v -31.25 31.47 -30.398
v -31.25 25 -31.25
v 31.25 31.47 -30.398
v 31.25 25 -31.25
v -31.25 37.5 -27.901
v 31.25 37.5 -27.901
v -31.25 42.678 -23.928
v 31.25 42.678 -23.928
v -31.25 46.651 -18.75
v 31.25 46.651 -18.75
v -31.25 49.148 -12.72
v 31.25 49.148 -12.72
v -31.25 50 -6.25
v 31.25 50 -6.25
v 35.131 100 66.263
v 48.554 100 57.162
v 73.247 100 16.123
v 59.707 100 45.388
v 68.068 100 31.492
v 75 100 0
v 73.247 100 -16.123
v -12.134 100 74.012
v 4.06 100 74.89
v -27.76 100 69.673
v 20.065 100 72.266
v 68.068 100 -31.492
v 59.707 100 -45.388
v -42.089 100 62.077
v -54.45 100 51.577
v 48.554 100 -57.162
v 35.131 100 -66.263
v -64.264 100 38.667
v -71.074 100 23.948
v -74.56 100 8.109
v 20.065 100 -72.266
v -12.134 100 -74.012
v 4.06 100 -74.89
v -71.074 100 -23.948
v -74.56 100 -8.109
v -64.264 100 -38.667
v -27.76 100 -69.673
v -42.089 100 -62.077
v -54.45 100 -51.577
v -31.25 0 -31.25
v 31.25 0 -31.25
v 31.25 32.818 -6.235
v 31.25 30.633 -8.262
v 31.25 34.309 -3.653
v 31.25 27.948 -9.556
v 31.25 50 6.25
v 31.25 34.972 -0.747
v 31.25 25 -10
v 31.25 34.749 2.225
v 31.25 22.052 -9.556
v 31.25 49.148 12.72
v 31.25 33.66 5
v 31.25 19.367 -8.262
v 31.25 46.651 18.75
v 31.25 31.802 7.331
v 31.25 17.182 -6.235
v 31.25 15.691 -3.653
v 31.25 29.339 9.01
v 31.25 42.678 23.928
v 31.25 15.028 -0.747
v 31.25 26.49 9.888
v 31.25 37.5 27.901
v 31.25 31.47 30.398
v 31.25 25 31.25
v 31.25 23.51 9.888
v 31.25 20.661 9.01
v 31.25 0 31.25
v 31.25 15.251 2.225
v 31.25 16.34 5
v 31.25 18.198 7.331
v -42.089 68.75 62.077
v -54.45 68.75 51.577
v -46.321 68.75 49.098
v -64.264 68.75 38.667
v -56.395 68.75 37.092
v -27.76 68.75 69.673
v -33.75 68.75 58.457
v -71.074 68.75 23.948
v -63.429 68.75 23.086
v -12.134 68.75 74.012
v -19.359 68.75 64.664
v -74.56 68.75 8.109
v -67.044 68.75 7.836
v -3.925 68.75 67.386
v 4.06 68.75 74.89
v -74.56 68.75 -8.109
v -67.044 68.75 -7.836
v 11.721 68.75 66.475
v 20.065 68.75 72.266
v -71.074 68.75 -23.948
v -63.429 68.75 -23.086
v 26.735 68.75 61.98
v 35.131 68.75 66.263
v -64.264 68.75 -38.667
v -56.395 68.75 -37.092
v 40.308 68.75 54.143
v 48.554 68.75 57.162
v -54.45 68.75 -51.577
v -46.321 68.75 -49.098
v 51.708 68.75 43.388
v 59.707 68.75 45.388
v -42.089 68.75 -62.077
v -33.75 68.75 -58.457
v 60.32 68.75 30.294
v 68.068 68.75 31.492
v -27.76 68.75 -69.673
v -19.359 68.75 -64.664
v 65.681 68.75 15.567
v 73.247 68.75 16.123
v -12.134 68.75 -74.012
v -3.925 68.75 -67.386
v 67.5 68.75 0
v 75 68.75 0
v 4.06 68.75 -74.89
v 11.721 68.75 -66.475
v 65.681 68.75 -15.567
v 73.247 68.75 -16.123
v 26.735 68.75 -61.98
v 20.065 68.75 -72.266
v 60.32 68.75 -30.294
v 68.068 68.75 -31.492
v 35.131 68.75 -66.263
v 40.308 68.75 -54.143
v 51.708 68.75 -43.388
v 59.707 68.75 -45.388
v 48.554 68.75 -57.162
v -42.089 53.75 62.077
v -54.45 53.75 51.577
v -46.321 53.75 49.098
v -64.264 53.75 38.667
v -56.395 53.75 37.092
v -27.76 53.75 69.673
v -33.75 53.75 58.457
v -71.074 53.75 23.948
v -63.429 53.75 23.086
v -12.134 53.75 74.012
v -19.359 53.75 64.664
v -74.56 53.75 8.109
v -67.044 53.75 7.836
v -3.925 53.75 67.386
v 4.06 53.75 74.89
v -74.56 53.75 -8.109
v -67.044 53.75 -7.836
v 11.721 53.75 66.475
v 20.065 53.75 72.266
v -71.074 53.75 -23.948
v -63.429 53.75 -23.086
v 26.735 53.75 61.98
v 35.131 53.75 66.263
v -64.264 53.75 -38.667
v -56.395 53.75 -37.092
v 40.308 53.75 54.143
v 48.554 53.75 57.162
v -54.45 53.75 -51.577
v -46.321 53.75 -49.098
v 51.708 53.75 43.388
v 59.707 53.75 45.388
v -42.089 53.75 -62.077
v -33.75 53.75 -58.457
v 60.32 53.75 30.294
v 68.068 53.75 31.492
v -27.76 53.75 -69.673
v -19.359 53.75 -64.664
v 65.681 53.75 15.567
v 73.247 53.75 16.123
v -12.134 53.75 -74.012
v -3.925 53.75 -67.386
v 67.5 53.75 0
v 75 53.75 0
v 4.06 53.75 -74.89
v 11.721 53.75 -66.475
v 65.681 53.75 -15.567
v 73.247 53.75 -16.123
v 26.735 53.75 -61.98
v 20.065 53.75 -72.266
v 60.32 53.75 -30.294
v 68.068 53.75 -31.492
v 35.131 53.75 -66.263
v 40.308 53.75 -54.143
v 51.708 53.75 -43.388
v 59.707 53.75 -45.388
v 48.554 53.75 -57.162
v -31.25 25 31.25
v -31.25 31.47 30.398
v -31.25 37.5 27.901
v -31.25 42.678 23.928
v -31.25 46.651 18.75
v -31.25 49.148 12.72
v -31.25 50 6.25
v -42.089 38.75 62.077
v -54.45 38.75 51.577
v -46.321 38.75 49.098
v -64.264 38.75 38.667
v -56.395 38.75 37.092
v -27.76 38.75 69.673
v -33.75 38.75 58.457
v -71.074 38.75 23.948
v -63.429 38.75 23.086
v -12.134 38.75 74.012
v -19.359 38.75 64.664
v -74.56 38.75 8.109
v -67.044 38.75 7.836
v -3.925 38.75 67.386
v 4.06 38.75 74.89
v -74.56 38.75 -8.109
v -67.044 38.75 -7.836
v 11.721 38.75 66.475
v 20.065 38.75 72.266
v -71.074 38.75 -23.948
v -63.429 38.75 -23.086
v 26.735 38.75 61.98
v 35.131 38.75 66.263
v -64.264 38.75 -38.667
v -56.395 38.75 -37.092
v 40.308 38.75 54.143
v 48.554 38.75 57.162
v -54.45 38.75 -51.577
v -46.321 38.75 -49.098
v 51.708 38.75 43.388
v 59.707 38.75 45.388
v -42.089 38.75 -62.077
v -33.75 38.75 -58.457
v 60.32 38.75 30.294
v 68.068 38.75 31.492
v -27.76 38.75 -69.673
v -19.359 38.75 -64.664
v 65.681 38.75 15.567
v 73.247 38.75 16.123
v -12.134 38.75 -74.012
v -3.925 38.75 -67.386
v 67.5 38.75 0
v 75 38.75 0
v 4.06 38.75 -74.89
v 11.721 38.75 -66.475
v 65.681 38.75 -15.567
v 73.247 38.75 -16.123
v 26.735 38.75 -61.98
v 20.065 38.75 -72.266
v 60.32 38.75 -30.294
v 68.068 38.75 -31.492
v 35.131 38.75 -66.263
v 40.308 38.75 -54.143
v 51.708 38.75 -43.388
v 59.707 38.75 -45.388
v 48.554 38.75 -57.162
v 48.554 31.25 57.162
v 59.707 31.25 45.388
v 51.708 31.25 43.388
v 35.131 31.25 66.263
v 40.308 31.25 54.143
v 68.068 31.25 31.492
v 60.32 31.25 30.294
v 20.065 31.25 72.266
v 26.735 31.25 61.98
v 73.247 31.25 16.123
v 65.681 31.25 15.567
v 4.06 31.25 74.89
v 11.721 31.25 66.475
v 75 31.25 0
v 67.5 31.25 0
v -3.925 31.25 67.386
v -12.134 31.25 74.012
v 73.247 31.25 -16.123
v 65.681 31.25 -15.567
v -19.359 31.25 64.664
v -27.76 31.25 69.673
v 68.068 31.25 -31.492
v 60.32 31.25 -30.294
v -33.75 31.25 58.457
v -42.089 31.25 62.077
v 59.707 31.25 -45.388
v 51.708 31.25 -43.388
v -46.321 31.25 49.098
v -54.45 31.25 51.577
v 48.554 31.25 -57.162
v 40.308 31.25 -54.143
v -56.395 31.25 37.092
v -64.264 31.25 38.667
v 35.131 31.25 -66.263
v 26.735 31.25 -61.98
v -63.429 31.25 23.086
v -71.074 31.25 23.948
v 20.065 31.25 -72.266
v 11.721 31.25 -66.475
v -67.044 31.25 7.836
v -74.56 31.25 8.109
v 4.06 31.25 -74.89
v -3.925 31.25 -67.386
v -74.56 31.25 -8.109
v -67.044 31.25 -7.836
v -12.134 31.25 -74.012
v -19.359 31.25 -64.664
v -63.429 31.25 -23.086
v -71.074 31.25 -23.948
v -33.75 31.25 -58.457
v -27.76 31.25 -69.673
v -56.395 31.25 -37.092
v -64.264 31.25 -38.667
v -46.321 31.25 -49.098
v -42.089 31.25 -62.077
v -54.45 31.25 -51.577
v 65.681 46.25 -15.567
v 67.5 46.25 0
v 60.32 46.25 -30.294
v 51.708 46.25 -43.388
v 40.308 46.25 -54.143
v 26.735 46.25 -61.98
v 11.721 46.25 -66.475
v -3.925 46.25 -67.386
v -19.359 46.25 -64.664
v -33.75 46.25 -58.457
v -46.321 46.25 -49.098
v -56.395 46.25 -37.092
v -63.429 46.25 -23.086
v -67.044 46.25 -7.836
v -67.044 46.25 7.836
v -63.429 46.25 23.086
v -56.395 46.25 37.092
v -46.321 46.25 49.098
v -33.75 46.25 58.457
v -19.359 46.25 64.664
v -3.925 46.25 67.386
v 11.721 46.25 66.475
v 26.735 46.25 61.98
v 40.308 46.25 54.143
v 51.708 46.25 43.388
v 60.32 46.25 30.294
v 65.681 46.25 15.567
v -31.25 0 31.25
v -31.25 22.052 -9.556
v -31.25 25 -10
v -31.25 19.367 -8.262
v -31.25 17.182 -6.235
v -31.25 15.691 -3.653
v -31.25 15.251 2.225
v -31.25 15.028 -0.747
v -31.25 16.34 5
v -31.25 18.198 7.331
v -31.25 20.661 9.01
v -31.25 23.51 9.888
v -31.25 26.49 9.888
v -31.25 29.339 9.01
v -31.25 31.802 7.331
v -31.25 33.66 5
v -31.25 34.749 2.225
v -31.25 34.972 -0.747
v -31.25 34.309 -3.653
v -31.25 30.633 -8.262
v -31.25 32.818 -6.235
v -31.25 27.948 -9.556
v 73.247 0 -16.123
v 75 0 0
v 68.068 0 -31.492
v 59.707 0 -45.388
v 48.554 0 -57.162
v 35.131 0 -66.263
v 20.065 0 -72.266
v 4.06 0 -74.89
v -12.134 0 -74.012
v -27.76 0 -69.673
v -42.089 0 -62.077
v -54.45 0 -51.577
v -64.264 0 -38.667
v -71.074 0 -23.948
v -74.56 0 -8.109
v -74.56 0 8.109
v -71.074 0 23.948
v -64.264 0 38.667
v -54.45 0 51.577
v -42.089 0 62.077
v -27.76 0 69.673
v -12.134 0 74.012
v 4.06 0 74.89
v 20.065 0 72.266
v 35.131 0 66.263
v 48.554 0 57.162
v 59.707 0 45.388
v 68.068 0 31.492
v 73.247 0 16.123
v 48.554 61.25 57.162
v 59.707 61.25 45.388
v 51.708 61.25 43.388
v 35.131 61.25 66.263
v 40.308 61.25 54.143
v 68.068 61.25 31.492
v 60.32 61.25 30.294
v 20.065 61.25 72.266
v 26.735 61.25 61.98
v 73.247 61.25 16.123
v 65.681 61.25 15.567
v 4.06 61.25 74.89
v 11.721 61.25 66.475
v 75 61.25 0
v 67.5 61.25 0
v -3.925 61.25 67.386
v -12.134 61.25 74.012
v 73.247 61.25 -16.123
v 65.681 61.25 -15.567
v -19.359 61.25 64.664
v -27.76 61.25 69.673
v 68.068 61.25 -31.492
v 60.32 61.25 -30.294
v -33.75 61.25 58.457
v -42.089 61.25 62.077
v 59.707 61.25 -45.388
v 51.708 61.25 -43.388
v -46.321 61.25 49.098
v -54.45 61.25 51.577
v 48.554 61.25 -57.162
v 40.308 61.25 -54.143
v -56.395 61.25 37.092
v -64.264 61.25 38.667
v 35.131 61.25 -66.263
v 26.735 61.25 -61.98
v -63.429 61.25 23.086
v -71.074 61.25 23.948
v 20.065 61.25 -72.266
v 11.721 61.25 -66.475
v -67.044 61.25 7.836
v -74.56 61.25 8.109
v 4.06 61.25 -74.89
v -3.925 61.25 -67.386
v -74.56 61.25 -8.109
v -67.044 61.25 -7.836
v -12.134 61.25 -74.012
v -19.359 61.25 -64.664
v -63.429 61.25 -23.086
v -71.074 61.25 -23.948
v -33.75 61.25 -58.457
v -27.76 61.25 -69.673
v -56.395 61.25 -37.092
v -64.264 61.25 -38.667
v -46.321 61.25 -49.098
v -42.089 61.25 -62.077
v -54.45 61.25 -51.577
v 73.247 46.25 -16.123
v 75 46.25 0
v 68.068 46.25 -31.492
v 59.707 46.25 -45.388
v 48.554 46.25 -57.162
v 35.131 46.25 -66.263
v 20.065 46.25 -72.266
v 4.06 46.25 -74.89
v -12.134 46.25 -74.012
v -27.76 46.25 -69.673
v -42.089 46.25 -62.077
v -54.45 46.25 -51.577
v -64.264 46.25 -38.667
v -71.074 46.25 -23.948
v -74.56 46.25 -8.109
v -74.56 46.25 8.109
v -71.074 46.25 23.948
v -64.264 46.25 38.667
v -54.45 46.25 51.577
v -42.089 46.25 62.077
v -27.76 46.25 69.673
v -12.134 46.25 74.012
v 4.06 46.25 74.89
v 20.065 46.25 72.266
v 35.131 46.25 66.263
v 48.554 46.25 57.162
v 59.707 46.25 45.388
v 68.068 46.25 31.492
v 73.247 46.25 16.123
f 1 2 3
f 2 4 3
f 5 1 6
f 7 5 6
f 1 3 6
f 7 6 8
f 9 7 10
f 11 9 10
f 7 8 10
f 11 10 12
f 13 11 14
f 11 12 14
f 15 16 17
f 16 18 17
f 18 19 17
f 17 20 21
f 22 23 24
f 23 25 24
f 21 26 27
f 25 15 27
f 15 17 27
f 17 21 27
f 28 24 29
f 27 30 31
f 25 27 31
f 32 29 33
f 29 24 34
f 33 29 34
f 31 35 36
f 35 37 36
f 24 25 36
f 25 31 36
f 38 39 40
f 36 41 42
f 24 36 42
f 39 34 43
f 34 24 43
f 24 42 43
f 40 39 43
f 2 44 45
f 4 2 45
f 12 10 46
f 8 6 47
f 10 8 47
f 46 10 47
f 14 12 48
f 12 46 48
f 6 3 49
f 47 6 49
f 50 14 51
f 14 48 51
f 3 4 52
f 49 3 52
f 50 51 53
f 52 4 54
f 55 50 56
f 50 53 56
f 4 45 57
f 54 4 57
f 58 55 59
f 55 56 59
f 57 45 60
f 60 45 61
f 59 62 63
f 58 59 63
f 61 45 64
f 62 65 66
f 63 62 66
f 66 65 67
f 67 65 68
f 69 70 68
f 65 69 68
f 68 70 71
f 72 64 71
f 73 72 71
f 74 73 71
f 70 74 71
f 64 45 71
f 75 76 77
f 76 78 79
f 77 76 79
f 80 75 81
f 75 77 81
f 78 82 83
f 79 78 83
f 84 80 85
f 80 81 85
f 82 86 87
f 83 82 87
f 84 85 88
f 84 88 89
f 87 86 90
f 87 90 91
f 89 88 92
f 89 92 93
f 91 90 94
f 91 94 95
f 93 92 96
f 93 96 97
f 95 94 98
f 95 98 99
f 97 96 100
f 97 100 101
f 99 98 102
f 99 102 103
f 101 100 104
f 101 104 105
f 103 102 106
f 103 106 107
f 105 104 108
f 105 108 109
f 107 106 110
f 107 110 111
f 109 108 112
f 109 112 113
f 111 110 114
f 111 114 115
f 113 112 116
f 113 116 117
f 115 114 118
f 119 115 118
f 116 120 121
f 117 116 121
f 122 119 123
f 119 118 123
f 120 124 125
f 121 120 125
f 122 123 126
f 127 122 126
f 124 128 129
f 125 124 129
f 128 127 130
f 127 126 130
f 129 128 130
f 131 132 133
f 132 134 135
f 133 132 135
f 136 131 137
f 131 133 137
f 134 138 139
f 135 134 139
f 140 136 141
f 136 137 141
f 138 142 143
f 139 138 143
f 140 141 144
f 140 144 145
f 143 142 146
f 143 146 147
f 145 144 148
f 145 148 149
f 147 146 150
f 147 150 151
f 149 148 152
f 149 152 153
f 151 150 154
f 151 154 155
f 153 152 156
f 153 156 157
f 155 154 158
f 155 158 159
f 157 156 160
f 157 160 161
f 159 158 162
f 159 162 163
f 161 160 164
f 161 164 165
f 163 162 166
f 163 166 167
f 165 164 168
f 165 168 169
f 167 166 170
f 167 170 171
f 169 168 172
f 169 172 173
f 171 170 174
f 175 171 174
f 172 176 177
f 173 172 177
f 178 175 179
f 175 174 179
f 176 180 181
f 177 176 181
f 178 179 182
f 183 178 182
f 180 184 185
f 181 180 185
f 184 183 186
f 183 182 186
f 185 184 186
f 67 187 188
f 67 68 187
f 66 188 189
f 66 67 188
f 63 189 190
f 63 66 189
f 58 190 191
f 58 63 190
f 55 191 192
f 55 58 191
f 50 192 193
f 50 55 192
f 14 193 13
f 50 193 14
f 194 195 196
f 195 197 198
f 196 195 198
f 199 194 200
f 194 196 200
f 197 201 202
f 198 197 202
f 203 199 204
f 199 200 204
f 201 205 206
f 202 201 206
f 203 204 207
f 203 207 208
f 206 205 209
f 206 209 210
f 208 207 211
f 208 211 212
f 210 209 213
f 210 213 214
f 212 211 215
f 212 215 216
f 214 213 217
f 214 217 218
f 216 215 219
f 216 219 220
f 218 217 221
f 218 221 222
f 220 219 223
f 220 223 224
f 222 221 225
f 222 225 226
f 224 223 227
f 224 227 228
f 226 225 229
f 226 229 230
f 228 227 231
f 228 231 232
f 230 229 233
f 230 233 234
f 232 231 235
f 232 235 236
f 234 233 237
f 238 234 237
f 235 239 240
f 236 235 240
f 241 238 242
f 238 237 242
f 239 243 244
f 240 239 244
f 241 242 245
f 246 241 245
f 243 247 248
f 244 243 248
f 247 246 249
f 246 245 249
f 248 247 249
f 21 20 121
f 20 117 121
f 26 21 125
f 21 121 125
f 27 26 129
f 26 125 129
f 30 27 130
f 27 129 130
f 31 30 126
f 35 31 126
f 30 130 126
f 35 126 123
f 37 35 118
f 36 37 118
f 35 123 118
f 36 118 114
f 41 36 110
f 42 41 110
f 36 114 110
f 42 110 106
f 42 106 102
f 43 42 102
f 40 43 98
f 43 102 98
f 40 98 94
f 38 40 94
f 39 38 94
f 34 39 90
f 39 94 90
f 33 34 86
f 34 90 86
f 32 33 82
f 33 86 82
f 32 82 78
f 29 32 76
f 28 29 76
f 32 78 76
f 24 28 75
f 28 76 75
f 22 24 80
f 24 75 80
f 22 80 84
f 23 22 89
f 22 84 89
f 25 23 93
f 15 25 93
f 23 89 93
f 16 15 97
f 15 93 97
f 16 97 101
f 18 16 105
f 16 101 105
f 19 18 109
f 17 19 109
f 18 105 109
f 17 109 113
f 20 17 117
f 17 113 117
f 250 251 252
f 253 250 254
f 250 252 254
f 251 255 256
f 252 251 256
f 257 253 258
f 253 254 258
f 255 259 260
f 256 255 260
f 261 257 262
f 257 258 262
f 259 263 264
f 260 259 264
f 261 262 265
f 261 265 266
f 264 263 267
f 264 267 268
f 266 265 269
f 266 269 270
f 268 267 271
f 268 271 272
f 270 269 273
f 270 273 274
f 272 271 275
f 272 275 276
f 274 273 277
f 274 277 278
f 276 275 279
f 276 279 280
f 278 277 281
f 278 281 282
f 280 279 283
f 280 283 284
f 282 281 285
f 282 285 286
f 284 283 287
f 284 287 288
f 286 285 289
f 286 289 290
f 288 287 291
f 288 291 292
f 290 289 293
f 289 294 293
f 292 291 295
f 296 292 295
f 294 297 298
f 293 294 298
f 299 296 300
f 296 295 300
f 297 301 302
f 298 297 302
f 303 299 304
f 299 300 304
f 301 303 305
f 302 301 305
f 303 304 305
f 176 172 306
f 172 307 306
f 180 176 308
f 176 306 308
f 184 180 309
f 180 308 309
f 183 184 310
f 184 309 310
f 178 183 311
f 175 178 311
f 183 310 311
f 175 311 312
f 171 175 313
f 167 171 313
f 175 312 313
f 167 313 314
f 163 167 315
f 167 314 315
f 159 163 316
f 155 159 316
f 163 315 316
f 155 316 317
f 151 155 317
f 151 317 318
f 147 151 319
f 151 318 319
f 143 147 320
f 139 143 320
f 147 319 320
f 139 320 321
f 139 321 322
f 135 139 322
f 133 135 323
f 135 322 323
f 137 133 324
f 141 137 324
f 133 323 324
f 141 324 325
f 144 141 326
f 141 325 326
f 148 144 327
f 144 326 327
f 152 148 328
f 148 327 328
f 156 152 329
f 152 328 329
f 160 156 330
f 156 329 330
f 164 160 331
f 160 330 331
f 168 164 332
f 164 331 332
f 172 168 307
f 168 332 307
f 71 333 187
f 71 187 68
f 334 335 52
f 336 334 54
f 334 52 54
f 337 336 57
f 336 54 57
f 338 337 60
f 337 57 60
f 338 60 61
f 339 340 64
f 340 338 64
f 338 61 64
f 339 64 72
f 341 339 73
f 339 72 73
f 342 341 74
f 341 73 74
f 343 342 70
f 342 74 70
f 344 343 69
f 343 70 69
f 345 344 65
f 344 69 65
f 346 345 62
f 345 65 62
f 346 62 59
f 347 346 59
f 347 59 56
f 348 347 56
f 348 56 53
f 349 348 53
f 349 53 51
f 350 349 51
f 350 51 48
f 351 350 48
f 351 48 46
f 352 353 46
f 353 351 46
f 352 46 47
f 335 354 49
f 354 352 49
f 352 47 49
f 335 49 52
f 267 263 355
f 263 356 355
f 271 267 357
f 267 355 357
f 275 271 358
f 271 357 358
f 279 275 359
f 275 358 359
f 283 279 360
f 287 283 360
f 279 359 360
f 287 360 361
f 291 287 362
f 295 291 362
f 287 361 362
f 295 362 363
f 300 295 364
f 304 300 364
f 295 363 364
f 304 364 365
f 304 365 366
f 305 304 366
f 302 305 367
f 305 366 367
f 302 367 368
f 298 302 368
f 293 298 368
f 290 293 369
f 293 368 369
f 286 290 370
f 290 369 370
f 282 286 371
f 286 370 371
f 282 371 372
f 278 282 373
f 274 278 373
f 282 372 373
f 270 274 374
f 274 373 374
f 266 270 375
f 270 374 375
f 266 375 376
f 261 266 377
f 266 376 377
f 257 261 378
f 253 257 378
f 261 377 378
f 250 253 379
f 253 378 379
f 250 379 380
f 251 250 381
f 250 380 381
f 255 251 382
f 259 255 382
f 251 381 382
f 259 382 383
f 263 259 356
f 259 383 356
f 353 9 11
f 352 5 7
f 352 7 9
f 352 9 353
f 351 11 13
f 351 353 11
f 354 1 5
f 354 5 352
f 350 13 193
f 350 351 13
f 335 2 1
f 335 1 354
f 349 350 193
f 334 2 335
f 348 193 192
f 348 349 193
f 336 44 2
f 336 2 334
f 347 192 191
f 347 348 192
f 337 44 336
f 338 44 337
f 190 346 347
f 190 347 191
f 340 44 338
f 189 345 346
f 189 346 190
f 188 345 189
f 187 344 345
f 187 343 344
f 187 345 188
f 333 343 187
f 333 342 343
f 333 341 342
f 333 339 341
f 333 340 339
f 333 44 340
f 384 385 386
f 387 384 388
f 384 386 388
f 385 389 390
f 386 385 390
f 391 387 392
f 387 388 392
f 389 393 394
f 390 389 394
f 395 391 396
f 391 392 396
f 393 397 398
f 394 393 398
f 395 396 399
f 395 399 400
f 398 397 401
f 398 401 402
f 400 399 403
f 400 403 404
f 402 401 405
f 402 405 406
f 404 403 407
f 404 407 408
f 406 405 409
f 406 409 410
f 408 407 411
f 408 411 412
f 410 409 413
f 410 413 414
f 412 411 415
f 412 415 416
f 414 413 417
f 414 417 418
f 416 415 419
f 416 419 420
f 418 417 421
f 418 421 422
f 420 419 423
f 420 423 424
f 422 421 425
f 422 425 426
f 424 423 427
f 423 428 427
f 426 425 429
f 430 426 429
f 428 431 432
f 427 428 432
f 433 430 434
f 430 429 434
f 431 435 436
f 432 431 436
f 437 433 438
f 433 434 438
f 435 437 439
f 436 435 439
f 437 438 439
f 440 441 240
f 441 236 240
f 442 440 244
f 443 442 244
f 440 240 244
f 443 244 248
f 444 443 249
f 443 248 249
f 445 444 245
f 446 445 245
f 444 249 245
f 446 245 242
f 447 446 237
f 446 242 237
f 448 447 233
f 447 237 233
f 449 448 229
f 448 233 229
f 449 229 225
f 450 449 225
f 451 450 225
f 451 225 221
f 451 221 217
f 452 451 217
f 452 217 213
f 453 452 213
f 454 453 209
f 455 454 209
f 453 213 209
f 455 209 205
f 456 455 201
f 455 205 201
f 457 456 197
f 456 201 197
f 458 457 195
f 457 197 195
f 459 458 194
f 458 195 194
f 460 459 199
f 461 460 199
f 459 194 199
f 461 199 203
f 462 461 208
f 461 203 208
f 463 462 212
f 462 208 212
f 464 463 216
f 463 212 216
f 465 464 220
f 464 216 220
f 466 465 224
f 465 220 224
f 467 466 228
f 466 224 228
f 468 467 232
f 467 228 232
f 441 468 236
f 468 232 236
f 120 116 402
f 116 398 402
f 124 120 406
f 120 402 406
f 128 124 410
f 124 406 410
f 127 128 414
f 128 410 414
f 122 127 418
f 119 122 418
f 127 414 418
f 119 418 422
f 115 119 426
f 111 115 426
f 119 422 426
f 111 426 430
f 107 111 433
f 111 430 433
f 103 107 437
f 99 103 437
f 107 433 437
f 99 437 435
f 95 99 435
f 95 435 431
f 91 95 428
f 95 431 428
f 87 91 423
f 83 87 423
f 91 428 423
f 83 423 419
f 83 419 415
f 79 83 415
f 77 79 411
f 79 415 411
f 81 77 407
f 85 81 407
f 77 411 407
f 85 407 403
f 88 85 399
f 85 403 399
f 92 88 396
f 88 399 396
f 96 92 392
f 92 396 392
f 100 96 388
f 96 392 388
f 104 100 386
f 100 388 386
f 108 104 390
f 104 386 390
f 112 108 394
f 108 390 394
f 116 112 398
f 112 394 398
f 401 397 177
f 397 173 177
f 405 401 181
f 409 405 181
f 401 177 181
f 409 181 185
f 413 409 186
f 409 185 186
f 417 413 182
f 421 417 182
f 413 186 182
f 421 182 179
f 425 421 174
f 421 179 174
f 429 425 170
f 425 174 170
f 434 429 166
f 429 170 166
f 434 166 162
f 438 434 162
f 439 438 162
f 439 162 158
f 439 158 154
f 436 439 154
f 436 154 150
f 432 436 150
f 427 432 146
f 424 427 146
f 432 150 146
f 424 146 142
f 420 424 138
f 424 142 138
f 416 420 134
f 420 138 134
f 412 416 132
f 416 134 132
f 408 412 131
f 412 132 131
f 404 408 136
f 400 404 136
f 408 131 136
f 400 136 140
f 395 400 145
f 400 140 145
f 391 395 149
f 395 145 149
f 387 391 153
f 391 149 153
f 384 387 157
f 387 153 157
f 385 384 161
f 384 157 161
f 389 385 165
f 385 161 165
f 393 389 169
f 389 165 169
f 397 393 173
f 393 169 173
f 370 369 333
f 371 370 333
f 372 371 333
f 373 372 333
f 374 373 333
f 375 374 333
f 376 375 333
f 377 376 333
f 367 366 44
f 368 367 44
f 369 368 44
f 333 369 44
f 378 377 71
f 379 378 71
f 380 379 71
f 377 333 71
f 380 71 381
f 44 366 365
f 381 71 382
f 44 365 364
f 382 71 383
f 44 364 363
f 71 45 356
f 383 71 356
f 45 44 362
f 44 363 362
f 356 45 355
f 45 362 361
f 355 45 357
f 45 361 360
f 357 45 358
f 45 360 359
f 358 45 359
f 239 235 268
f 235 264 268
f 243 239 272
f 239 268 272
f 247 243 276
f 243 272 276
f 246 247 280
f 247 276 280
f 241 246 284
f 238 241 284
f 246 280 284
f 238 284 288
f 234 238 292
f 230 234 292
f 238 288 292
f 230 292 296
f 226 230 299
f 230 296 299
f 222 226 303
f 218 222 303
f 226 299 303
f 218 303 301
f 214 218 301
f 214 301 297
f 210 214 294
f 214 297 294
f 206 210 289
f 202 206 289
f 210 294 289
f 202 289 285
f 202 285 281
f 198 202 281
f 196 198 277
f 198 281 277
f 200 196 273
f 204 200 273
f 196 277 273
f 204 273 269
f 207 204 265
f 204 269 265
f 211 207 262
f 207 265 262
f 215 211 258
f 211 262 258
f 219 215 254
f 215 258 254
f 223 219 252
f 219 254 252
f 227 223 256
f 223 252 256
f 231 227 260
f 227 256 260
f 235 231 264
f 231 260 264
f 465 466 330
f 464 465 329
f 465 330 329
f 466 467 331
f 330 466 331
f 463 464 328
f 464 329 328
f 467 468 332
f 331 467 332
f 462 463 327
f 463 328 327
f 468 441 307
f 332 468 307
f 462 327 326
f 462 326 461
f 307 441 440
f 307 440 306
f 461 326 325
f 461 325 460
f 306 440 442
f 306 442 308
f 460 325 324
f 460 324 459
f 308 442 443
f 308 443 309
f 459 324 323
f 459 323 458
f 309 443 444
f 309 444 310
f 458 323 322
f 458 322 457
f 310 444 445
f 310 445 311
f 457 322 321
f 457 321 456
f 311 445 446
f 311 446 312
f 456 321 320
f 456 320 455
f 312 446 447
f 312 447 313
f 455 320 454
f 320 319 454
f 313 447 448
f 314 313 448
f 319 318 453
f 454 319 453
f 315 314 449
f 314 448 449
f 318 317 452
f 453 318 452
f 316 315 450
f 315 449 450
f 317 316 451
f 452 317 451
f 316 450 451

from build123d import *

# Parameters (mm, degrees)
SKETCH2_W           = 62.5
SKETCH2_H           = 62.5
CUT_EXTRUDE1_DEPTH  = 50
BOSS_EXTRUDE1_REACH = 166.055
SKETCH3_R           = 10
FILLET1_R           = 25


with BuildPart() as part:
    # Sketch1 → Revolve1 (revolve)
    with BuildSketch(Plane.XY, mode=Mode.PRIVATE) as revolve1_sk:
        Polygon((0, 0), (0, 100), (-75, 100), (-75, 68.75), (-67.5, 68.75), (-67.5, 61.25), (-75, 61.25), (-75, 53.75), (-67.5, 53.75), (-67.5, 46.25), (-75, 46.25), (-75, 38.75), (-67.5, 38.75), (-67.5, 31.25), (-75, 31.25), (-75, 0), align=None)
    revolve(revolve1_sk.sketch.rotate(Axis((0, 0, 0), (0, 1, 0)), 180), axis=Axis((0, 0, 0), (0, 1, 0)))

    # Sketch2 → Cut-Extrude1 (cut)
    with BuildSketch(Plane.XZ):
        Rectangle(SKETCH2_W, SKETCH2_H)
    extrude(amount=-CUT_EXTRUDE1_DEPTH, mode=Mode.SUBTRACT)

    # Sketch3 → Boss-Extrude1 (add, up to next)
    with BuildSketch(Plane.ZY.offset(-31.25), mode=Mode.PRIVATE) as boss_extrude1_sk1:
        with Locations(Location((0, 25, 0), (0, 0, 180))):
            Circle(SKETCH3_R)
    boss_extrude1_tool1 = extrude(boss_extrude1_sk1.sketch, amount=BOSS_EXTRUDE1_REACH, mode=Mode.PRIVATE) - part.part
    add(boss_extrude1_tool1.solids().sort_by_distance((31.25, 25, 0))[0])

    # Fillet1
    fillet1_edges = [part.edges().sort_by_distance(p)[0] for p in [
        (0, 50, -31.25),
        (0, 50, 31.25),
    ]]
    fillet(fillet1_edges, radius=FILLET1_R)


solid = part.part
